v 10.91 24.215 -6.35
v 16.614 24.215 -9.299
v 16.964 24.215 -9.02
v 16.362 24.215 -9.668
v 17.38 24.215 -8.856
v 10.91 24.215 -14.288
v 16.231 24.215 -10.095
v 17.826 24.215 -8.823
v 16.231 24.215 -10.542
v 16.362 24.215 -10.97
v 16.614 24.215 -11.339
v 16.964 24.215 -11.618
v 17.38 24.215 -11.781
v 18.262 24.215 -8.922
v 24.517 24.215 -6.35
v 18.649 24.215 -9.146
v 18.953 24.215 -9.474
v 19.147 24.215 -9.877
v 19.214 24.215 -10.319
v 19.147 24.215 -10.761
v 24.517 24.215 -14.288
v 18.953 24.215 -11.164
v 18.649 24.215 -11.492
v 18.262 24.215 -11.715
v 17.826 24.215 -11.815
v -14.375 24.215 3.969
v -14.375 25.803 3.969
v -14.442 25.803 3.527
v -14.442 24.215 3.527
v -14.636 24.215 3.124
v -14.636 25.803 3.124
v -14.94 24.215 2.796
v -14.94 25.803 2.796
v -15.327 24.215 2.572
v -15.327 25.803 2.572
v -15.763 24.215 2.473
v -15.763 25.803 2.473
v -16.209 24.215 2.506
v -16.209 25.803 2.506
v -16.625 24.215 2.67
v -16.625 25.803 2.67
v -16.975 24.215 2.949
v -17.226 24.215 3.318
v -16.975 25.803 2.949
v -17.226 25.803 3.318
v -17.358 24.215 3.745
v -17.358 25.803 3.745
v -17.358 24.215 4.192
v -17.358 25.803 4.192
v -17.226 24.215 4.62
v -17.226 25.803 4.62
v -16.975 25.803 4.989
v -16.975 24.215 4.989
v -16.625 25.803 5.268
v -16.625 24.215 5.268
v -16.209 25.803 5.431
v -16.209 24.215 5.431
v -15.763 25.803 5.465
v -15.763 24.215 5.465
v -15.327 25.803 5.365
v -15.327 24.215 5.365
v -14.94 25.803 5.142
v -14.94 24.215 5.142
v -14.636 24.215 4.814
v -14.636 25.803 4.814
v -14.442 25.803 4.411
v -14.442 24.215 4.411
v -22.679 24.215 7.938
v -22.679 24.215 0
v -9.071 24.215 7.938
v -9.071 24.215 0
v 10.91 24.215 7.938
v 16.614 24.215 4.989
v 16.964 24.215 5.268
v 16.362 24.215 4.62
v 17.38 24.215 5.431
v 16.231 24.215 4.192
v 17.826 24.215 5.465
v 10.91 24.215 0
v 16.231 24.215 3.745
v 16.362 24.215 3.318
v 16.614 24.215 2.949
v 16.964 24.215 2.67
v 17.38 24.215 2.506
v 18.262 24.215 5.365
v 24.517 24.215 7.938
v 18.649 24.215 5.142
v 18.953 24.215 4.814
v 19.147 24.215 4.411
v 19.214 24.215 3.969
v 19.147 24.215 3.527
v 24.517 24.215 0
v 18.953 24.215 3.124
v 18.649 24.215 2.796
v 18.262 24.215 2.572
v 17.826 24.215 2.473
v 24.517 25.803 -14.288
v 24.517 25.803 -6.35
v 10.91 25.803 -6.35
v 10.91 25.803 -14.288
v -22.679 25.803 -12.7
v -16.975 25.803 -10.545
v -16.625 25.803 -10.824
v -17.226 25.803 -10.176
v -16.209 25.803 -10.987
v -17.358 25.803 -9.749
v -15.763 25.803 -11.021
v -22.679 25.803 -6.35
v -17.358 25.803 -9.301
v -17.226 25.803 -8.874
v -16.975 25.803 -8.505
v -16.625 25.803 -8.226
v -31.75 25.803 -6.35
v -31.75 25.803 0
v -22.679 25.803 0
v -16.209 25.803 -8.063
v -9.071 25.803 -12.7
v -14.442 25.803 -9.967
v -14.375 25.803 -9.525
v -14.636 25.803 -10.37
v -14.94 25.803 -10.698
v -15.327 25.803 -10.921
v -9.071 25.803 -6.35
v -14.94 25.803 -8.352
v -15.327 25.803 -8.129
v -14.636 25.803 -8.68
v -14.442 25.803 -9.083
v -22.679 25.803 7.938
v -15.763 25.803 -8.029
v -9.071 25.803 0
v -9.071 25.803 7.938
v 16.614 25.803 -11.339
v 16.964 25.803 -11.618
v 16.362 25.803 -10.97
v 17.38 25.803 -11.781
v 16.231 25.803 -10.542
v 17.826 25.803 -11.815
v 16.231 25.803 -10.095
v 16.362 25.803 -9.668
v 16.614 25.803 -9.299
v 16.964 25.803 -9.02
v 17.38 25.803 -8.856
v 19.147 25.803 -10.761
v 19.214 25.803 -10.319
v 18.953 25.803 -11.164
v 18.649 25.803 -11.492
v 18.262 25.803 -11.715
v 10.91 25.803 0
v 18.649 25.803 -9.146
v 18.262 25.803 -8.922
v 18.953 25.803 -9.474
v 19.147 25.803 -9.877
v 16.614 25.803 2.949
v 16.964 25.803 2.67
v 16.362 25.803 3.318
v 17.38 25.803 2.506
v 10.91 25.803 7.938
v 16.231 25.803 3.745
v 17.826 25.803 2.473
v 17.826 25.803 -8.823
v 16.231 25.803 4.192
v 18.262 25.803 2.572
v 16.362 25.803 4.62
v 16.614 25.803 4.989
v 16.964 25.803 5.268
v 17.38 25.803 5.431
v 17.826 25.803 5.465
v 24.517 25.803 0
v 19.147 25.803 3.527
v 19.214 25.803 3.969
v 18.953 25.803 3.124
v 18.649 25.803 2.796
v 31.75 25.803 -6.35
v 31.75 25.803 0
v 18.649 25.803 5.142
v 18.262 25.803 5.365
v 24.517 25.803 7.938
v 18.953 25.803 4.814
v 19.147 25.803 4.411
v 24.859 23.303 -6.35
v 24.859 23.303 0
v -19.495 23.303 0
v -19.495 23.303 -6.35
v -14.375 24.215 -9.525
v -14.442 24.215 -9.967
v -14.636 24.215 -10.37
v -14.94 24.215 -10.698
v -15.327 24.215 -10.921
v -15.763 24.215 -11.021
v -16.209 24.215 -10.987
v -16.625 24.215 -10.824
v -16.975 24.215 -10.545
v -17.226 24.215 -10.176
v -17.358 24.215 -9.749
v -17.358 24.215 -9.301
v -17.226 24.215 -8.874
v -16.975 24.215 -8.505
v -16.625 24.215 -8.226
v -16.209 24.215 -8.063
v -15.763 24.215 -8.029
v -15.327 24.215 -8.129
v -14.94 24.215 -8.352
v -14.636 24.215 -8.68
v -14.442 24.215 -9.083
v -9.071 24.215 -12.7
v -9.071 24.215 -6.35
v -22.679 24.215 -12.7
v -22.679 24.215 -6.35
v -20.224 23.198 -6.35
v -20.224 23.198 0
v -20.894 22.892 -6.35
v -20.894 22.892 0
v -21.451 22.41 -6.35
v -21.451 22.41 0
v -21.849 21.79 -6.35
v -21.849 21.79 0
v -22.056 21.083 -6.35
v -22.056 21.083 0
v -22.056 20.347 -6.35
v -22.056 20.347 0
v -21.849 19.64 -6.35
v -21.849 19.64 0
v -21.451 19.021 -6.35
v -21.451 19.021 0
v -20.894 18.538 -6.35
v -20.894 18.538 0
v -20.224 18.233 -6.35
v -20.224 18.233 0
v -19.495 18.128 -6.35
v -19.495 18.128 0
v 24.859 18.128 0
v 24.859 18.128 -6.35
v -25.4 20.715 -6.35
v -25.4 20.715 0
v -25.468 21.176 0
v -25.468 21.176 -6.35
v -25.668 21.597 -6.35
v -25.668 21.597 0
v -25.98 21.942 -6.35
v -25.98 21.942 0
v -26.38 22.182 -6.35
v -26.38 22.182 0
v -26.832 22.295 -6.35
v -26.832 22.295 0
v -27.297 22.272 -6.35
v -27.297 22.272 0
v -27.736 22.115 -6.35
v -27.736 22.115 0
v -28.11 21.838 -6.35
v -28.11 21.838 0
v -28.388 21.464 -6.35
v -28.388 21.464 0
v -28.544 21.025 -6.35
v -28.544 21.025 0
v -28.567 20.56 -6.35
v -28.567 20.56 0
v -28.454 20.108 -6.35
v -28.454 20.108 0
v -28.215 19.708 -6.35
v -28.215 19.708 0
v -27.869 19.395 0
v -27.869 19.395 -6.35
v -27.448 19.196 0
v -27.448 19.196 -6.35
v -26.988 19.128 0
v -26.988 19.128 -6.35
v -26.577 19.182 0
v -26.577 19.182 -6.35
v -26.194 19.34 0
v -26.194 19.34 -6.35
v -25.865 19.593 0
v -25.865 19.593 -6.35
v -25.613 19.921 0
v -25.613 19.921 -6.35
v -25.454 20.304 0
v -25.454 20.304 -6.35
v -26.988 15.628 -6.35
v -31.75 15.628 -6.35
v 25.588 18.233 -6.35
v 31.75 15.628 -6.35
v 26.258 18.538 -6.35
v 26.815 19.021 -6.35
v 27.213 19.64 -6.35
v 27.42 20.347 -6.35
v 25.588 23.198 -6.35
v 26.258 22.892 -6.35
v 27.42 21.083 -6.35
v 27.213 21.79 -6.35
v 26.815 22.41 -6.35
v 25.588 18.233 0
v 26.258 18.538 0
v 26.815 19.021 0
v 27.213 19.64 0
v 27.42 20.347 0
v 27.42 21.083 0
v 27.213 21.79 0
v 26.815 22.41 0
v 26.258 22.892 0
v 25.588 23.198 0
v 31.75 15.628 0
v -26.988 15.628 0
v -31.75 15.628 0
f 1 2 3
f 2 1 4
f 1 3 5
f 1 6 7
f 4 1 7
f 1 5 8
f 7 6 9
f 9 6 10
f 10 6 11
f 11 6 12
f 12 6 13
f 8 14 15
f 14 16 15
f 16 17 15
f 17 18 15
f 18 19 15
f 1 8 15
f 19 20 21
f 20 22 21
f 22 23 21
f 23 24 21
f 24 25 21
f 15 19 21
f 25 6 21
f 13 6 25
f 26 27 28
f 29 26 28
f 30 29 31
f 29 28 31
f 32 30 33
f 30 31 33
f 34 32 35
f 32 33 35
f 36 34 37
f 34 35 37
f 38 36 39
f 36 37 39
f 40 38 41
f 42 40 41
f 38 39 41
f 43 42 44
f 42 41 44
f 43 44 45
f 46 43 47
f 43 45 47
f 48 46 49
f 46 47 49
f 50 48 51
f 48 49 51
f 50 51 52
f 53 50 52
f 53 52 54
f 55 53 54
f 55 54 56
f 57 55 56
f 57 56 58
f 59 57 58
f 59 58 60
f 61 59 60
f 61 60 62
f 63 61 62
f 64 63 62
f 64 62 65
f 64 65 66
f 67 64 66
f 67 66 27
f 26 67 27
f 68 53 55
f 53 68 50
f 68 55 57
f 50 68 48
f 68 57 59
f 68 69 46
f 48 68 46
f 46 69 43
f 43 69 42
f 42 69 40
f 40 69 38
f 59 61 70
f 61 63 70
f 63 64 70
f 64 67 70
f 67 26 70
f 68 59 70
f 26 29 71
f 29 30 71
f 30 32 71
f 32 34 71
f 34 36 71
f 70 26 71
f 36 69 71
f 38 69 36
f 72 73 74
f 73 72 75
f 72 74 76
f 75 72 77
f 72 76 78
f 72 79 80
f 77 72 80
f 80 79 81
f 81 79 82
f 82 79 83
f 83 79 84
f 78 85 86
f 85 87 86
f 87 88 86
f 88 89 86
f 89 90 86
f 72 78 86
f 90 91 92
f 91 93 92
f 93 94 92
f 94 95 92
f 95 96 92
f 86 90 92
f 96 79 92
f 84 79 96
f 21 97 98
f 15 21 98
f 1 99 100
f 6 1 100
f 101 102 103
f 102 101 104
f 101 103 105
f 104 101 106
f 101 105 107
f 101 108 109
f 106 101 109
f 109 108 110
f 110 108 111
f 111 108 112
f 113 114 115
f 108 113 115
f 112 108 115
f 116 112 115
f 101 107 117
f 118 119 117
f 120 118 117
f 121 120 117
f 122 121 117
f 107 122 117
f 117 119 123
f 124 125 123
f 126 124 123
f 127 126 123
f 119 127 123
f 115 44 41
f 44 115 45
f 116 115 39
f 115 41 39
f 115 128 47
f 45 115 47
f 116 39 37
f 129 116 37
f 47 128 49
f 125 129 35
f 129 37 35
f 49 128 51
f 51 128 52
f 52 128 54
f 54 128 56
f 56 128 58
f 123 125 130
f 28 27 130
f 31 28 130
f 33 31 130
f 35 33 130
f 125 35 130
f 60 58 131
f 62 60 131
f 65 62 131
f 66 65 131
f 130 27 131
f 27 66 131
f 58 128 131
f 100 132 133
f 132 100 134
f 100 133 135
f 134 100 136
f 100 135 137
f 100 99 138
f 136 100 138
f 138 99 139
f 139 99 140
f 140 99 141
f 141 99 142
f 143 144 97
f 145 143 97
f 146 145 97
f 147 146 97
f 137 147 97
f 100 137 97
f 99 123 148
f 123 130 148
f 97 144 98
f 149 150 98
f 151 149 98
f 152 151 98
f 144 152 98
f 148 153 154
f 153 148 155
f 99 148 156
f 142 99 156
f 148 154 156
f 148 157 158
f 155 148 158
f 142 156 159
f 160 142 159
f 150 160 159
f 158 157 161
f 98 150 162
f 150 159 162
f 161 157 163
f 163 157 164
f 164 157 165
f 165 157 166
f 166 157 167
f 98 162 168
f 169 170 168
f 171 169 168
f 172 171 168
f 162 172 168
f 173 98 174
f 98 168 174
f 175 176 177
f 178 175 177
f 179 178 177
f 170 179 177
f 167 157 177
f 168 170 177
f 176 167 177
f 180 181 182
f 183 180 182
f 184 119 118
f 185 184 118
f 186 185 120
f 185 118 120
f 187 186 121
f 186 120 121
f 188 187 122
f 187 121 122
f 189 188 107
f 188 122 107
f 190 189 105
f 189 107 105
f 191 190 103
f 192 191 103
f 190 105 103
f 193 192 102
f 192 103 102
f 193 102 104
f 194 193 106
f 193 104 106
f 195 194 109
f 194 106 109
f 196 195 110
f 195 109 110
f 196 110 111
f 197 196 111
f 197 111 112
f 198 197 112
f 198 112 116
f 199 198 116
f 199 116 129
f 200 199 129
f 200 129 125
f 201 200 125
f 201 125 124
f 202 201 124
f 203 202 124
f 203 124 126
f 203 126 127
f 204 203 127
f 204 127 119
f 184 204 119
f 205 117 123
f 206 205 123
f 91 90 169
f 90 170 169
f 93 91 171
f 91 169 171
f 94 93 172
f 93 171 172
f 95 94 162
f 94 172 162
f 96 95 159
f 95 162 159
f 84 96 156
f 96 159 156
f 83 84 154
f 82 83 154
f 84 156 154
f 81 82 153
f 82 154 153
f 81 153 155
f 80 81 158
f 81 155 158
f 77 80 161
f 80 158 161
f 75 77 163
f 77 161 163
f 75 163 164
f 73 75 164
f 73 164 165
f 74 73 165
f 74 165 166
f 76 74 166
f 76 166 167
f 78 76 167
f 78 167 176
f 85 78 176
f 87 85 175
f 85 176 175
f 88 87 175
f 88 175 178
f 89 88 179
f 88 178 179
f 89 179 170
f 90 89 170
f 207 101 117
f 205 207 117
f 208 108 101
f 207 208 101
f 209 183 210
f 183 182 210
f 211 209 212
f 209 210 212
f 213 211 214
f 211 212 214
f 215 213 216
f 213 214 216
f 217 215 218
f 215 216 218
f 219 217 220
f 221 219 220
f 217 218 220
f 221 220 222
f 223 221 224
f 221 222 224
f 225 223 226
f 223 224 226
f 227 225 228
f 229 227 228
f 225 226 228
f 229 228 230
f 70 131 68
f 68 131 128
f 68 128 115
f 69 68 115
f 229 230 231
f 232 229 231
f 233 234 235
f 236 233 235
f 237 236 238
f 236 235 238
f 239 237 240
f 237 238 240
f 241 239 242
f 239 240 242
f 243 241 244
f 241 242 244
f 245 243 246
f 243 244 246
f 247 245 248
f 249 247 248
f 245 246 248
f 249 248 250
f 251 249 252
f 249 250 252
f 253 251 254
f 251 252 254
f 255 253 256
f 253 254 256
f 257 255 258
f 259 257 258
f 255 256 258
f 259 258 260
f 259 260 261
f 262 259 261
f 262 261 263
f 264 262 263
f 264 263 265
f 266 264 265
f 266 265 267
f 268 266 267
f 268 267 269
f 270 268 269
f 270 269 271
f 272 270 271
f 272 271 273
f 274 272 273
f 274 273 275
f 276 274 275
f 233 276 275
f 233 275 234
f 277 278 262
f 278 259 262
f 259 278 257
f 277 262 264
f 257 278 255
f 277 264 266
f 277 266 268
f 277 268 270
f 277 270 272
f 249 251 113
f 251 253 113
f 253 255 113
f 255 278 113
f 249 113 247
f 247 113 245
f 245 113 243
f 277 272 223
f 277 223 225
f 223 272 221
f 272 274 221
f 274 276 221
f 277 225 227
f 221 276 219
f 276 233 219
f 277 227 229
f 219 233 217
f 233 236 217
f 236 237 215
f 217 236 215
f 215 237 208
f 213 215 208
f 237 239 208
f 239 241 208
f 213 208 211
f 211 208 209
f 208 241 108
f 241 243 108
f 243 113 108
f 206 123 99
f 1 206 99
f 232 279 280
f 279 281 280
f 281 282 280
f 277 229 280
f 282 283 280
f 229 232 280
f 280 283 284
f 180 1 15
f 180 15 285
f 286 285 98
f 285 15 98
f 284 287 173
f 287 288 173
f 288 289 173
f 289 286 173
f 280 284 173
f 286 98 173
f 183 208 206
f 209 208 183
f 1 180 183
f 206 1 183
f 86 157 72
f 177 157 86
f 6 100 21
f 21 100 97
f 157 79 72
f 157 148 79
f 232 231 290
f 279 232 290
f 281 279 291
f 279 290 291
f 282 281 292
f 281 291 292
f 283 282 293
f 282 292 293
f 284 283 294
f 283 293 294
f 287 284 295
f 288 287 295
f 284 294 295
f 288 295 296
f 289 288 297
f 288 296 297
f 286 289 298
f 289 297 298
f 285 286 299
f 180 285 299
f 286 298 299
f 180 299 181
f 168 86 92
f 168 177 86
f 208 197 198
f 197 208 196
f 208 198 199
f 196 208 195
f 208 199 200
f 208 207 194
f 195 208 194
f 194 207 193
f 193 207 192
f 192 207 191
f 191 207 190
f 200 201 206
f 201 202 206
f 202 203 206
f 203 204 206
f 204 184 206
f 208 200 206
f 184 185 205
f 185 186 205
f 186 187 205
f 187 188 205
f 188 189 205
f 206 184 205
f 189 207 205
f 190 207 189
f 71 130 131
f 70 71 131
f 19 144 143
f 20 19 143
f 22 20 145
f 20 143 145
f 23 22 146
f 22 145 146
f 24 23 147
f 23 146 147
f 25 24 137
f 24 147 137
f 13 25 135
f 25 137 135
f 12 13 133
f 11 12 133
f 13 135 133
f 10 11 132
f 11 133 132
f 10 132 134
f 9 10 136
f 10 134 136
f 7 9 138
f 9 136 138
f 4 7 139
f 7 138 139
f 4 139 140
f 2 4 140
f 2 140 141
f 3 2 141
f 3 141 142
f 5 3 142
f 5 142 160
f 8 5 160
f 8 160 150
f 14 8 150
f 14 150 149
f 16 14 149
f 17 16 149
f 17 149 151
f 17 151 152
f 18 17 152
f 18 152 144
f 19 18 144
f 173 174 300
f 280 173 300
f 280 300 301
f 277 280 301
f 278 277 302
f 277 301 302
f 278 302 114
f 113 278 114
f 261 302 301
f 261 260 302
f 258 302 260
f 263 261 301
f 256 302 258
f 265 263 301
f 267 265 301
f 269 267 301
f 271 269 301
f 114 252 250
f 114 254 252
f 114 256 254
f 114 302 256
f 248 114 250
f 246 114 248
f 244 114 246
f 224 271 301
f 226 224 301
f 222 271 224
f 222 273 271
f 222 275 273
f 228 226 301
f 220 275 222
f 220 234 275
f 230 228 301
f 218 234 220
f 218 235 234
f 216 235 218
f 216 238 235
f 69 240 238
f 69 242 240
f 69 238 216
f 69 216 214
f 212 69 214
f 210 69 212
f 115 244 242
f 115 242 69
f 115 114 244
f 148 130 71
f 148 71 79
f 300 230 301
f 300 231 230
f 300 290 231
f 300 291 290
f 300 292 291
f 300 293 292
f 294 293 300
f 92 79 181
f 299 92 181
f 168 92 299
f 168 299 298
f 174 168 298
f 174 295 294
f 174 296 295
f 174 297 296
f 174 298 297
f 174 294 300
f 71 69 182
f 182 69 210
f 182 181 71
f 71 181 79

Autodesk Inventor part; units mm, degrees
ref_plane "YZ Plane" through (0, 0, 0) normal (1, 0, 0) x (0, 1, 0)
ref_plane "XZ Plane" through (0, 0, 0) normal (0, 1, 0) x (-1, 0, 0)
sketch "Sketch1" plane through (0, 0, 0) normal (0, 0, 1) x (1, 0, 0)
  line L0 (-22.235, -36.3697) -> (-22.235, -26.7755) projected
  line L1 (-22.235, -26.7755) -> (-25.9663, -26.7755) projected
  line L2 (-26.045, -26.8374) -> (-26.045, -30.1399) projected
  arc A0 (-26.045, -30.1399) -> (-26.045, -34.0927) centre (-24.7167, -32.1163) ccw projected
  line L3 (-26.045, -34.0927) -> (-26.045, -36.3697) projected
  line L4 (-26.045, -36.3697) -> (-31.75, -36.3697) projected
  line L5 (-31.75, -36.3697) -> (-31.75, -19.7975) projected
  line L6 (-31.75, -19.7975) -> (31.75, -19.7975) projected
  line L7 (31.75, -19.7975) -> (31.75, -36.3697) projected
  line L8 (31.75, -36.3697) -> (-22.235, -36.3697) projected
  line L9 (24.7167, -22.9725) -> (-19.6375, -22.9725) projected
  arc A1 (-19.6375, -22.9725) -> (-19.6375, -28.1475) centre (-19.6375, -25.56) ccw projected
  line L10 (-19.6375, -28.1475) -> (24.7167, -28.1475) projected
  arc A2 (24.7167, -28.1475) -> (24.7167, -22.9725) centre (24.7167, -25.56) ccw projected
  line L11 (-18.6822, -29.735) -> (-18.6822, -34.4975) projected
  line L12 (-18.6822, -34.4975) -> (24.7167, -34.4975) projected
  arc A3 (24.7167, -34.4975) -> (24.7167, -29.735) centre (24.7167, -32.1163) ccw projected
  line L13 (24.7167, -29.735) -> (-18.6822, -29.735) projected
  line L14 (-31.75, 25.8027) -> (31.75, 25.8027)
  line L15 (31.75, 25.8027) -> (31.75, 15.6277)
  line L16 (31.75, 15.6277) -> (-31.75, 15.6277)
  line L17 (-31.75, 15.6277) -> (-31.75, 25.8027)
  circle A4 centre (-26.9875, 20.7152) radius 1.5875
  line L18 (-26.9875, 20.7152) -> (-26.9875, 4.175)
  line L19 (-19.4952, 20.7152) -> (24.859, 20.7152) construction
  line L20 (-19.4952, 18.1277) -> (24.859, 18.1277)
  line L21 (24.859, 23.3027) -> (-19.4952, 23.3027)
  arc A5 (-19.4952, 23.3027) -> (-19.4952, 18.1277) centre (-19.4952, 20.7152) ccw
  arc A6 (24.859, 18.1277) -> (24.859, 23.3027) centre (24.859, 20.7152) ccw
  line L22 (12.1015, 23.3027) -> (12.1015, 18.1277) construction
  line L23 (12.1015, -22.9725) -> (12.1015, -28.1475) construction
  line L24 (-31.75, 20.7152) -> (-23.8125, 20.7152) construction
  arc A7 (-25.9663, -26.7755) -> (-26.045, -26.8374) centre (-26.9875, -25.56) ccw projected
  point P0 (0, 0)
  point P1 (2.6819, 20.7152)
  dimension "d0" = 2.5
  dimension "d5" = 44.3542
ref_plane "Work Plane1" through (-31.75, -10.525, -6.35) normal (0, 0, -1) x (0, 1, 0)
extrude "Extrusion1" add sketch "Sketch1" against normal up to surface (6.35 mm away) contours L14 L15 L16 L17
sketch "Sketch2" plane through (31.75, 15.6277, -6.35) normal (0, 0, -1) x (-1, 0, 0)
  point P0 (31.75, -15.6277)
sketch "Sketch3" plane through (-31.75, 25.8027, 0) normal (0, 1, 0) x (1, 0, 0)
  line L0 (0.254, -20.066) -> (0.254, 30.48) projected
  arc A0 (6.604, 36.83) -> (0.254, 30.48) centre (6.604, 30.48) ccw projected
  line L1 (6.604, 36.83) -> (57.15, 36.83) projected
  arc A1 (63.5, 30.48) -> (57.15, 36.83) centre (57.15, 30.48) ccw projected
  line L2 (63.5, -20.066) -> (63.5, 30.48) projected
  arc A2 (57.15, -26.416) -> (63.5, -20.066) centre (57.15, -20.066) ccw projected
  line L3 (6.604, -26.416) -> (57.15, -26.416) projected
  arc A3 (0.254, -20.066) -> (6.604, -26.416) centre (6.604, -20.066) ccw projected
  circle A4 centre (59.817, 30.607) radius 1.4732 projected
  circle A5 centre (3.937, 30.607) radius 1.4732 projected
  circle A6 centre (59.817, -20.193) radius 1.4732 projected
  circle A7 centre (3.937, -20.193) radius 1.4732 projected
  line L4 (63.5, 0) -> (0, 0) projected
  line L5 (0, 0) -> (63.5, 0) projected
  line L6 (9.0714, 0) -> (22.6786, 0)
  line L7 (22.6786, 0) -> (22.6786, -7.9375)
  line L8 (22.6786, -7.9375) -> (9.0714, -7.9375)
  line L9 (9.0714, -7.9375) -> (9.0714, 0)
  line L10 (63.5, 6.35) -> (0, 6.35) projected
  line L11 (22.6786, 6.35) -> (9.0714, 6.35)
  line L12 (9.0714, 6.35) -> (9.0714, 12.7)
  line L13 (9.0714, 12.7) -> (22.6786, 12.7)
  line L14 (22.6786, 12.7) -> (22.6786, 6.35)
  line L15 (56.2674, 0) -> (42.6602, 0)
  line L16 (42.6602, 0) -> (42.6602, -7.9375)
  line L17 (42.6602, -7.9375) -> (56.2674, -7.9375)
  line L18 (56.2674, -7.9375) -> (56.2674, 0)
  line L19 (0, 6.35) -> (63.5, 6.35) projected
  line L20 (56.2674, 6.35) -> (42.6602, 6.35)
  line L21 (42.6602, 6.35) -> (42.6602, 14.2875)
  line L22 (42.6602, 14.2875) -> (56.2674, 14.2875)
  line L23 (56.2674, 14.2875) -> (56.2674, 6.35)
  point P0 (31.75, 0)
extrude "Extrusion2" add sketch "Sketch3" against normal blind 1.5875 contours L4 L7 L8 L9 | L12 L13 L14 L10 | L4 L18 L17 L16 | L21 L22 L23 L10
sketch "Sketch4" plane through (-31.75, 25.8027, 0) normal (0, 1, 0) x (1, 0, 0)
  line L0 (63.5, 6.35) -> (56.2674, 6.35) projected
  line L1 (56.2674, 6.35) -> (56.2674, 14.2875) projected
  line L2 (56.2674, 14.2875) -> (42.6602, 14.2875) projected
  line L3 (42.6602, 14.2875) -> (42.6602, 6.35) projected
  line L4 (42.6602, 6.35) -> (22.6786, 6.35) projected
  line L5 (22.6786, 6.35) -> (22.6786, 12.7) projected
  line L6 (22.6786, 12.7) -> (9.0714, 12.7) projected
  line L7 (9.0714, 12.7) -> (9.0714, 6.35) projected
  line L8 (9.0714, 6.35) -> (0, 6.35) projected
  line L9 (0, 0) -> (0, 6.35) projected
  line L10 (9.0714, 0) -> (0, 0) projected
  line L11 (9.0714, 0) -> (9.0714, -7.9375) projected
  line L12 (9.0714, -7.9375) -> (22.6786, -7.9375) projected
  line L13 (22.6786, -7.9375) -> (22.6786, 0) projected
  line L14 (42.6602, 0) -> (22.6786, 0) projected
  line L15 (42.6602, 0) -> (42.6602, -7.9375) projected
  line L16 (42.6602, -7.9375) -> (56.2674, -7.9375) projected
  line L17 (56.2674, -7.9375) -> (56.2674, 0) projected
  line L18 (63.5, 0) -> (56.2674, 0) projected
  line L19 (63.5, 0) -> (63.5, 6.35) projected
  circle A0 centre (49.4638, -3.9688) radius 1.5
  circle A1 centre (49.4638, 10.3188) radius 1.5
  circle A2 centre (15.875, -3.9688) radius 1.5
  circle A3 centre (15.875, 9.525) radius 1.5
  point P0 (31.75, 0)
  dimension "d6" = 3
  dimension "d7" = 3
  dimension "d8" = 3
  dimension "d9" = 3
extrude "Extrusion3" cut sketch "Sketch4" against normal through all contours A0 | A1 | A2 | A3
properties part number "_3DPrint"
